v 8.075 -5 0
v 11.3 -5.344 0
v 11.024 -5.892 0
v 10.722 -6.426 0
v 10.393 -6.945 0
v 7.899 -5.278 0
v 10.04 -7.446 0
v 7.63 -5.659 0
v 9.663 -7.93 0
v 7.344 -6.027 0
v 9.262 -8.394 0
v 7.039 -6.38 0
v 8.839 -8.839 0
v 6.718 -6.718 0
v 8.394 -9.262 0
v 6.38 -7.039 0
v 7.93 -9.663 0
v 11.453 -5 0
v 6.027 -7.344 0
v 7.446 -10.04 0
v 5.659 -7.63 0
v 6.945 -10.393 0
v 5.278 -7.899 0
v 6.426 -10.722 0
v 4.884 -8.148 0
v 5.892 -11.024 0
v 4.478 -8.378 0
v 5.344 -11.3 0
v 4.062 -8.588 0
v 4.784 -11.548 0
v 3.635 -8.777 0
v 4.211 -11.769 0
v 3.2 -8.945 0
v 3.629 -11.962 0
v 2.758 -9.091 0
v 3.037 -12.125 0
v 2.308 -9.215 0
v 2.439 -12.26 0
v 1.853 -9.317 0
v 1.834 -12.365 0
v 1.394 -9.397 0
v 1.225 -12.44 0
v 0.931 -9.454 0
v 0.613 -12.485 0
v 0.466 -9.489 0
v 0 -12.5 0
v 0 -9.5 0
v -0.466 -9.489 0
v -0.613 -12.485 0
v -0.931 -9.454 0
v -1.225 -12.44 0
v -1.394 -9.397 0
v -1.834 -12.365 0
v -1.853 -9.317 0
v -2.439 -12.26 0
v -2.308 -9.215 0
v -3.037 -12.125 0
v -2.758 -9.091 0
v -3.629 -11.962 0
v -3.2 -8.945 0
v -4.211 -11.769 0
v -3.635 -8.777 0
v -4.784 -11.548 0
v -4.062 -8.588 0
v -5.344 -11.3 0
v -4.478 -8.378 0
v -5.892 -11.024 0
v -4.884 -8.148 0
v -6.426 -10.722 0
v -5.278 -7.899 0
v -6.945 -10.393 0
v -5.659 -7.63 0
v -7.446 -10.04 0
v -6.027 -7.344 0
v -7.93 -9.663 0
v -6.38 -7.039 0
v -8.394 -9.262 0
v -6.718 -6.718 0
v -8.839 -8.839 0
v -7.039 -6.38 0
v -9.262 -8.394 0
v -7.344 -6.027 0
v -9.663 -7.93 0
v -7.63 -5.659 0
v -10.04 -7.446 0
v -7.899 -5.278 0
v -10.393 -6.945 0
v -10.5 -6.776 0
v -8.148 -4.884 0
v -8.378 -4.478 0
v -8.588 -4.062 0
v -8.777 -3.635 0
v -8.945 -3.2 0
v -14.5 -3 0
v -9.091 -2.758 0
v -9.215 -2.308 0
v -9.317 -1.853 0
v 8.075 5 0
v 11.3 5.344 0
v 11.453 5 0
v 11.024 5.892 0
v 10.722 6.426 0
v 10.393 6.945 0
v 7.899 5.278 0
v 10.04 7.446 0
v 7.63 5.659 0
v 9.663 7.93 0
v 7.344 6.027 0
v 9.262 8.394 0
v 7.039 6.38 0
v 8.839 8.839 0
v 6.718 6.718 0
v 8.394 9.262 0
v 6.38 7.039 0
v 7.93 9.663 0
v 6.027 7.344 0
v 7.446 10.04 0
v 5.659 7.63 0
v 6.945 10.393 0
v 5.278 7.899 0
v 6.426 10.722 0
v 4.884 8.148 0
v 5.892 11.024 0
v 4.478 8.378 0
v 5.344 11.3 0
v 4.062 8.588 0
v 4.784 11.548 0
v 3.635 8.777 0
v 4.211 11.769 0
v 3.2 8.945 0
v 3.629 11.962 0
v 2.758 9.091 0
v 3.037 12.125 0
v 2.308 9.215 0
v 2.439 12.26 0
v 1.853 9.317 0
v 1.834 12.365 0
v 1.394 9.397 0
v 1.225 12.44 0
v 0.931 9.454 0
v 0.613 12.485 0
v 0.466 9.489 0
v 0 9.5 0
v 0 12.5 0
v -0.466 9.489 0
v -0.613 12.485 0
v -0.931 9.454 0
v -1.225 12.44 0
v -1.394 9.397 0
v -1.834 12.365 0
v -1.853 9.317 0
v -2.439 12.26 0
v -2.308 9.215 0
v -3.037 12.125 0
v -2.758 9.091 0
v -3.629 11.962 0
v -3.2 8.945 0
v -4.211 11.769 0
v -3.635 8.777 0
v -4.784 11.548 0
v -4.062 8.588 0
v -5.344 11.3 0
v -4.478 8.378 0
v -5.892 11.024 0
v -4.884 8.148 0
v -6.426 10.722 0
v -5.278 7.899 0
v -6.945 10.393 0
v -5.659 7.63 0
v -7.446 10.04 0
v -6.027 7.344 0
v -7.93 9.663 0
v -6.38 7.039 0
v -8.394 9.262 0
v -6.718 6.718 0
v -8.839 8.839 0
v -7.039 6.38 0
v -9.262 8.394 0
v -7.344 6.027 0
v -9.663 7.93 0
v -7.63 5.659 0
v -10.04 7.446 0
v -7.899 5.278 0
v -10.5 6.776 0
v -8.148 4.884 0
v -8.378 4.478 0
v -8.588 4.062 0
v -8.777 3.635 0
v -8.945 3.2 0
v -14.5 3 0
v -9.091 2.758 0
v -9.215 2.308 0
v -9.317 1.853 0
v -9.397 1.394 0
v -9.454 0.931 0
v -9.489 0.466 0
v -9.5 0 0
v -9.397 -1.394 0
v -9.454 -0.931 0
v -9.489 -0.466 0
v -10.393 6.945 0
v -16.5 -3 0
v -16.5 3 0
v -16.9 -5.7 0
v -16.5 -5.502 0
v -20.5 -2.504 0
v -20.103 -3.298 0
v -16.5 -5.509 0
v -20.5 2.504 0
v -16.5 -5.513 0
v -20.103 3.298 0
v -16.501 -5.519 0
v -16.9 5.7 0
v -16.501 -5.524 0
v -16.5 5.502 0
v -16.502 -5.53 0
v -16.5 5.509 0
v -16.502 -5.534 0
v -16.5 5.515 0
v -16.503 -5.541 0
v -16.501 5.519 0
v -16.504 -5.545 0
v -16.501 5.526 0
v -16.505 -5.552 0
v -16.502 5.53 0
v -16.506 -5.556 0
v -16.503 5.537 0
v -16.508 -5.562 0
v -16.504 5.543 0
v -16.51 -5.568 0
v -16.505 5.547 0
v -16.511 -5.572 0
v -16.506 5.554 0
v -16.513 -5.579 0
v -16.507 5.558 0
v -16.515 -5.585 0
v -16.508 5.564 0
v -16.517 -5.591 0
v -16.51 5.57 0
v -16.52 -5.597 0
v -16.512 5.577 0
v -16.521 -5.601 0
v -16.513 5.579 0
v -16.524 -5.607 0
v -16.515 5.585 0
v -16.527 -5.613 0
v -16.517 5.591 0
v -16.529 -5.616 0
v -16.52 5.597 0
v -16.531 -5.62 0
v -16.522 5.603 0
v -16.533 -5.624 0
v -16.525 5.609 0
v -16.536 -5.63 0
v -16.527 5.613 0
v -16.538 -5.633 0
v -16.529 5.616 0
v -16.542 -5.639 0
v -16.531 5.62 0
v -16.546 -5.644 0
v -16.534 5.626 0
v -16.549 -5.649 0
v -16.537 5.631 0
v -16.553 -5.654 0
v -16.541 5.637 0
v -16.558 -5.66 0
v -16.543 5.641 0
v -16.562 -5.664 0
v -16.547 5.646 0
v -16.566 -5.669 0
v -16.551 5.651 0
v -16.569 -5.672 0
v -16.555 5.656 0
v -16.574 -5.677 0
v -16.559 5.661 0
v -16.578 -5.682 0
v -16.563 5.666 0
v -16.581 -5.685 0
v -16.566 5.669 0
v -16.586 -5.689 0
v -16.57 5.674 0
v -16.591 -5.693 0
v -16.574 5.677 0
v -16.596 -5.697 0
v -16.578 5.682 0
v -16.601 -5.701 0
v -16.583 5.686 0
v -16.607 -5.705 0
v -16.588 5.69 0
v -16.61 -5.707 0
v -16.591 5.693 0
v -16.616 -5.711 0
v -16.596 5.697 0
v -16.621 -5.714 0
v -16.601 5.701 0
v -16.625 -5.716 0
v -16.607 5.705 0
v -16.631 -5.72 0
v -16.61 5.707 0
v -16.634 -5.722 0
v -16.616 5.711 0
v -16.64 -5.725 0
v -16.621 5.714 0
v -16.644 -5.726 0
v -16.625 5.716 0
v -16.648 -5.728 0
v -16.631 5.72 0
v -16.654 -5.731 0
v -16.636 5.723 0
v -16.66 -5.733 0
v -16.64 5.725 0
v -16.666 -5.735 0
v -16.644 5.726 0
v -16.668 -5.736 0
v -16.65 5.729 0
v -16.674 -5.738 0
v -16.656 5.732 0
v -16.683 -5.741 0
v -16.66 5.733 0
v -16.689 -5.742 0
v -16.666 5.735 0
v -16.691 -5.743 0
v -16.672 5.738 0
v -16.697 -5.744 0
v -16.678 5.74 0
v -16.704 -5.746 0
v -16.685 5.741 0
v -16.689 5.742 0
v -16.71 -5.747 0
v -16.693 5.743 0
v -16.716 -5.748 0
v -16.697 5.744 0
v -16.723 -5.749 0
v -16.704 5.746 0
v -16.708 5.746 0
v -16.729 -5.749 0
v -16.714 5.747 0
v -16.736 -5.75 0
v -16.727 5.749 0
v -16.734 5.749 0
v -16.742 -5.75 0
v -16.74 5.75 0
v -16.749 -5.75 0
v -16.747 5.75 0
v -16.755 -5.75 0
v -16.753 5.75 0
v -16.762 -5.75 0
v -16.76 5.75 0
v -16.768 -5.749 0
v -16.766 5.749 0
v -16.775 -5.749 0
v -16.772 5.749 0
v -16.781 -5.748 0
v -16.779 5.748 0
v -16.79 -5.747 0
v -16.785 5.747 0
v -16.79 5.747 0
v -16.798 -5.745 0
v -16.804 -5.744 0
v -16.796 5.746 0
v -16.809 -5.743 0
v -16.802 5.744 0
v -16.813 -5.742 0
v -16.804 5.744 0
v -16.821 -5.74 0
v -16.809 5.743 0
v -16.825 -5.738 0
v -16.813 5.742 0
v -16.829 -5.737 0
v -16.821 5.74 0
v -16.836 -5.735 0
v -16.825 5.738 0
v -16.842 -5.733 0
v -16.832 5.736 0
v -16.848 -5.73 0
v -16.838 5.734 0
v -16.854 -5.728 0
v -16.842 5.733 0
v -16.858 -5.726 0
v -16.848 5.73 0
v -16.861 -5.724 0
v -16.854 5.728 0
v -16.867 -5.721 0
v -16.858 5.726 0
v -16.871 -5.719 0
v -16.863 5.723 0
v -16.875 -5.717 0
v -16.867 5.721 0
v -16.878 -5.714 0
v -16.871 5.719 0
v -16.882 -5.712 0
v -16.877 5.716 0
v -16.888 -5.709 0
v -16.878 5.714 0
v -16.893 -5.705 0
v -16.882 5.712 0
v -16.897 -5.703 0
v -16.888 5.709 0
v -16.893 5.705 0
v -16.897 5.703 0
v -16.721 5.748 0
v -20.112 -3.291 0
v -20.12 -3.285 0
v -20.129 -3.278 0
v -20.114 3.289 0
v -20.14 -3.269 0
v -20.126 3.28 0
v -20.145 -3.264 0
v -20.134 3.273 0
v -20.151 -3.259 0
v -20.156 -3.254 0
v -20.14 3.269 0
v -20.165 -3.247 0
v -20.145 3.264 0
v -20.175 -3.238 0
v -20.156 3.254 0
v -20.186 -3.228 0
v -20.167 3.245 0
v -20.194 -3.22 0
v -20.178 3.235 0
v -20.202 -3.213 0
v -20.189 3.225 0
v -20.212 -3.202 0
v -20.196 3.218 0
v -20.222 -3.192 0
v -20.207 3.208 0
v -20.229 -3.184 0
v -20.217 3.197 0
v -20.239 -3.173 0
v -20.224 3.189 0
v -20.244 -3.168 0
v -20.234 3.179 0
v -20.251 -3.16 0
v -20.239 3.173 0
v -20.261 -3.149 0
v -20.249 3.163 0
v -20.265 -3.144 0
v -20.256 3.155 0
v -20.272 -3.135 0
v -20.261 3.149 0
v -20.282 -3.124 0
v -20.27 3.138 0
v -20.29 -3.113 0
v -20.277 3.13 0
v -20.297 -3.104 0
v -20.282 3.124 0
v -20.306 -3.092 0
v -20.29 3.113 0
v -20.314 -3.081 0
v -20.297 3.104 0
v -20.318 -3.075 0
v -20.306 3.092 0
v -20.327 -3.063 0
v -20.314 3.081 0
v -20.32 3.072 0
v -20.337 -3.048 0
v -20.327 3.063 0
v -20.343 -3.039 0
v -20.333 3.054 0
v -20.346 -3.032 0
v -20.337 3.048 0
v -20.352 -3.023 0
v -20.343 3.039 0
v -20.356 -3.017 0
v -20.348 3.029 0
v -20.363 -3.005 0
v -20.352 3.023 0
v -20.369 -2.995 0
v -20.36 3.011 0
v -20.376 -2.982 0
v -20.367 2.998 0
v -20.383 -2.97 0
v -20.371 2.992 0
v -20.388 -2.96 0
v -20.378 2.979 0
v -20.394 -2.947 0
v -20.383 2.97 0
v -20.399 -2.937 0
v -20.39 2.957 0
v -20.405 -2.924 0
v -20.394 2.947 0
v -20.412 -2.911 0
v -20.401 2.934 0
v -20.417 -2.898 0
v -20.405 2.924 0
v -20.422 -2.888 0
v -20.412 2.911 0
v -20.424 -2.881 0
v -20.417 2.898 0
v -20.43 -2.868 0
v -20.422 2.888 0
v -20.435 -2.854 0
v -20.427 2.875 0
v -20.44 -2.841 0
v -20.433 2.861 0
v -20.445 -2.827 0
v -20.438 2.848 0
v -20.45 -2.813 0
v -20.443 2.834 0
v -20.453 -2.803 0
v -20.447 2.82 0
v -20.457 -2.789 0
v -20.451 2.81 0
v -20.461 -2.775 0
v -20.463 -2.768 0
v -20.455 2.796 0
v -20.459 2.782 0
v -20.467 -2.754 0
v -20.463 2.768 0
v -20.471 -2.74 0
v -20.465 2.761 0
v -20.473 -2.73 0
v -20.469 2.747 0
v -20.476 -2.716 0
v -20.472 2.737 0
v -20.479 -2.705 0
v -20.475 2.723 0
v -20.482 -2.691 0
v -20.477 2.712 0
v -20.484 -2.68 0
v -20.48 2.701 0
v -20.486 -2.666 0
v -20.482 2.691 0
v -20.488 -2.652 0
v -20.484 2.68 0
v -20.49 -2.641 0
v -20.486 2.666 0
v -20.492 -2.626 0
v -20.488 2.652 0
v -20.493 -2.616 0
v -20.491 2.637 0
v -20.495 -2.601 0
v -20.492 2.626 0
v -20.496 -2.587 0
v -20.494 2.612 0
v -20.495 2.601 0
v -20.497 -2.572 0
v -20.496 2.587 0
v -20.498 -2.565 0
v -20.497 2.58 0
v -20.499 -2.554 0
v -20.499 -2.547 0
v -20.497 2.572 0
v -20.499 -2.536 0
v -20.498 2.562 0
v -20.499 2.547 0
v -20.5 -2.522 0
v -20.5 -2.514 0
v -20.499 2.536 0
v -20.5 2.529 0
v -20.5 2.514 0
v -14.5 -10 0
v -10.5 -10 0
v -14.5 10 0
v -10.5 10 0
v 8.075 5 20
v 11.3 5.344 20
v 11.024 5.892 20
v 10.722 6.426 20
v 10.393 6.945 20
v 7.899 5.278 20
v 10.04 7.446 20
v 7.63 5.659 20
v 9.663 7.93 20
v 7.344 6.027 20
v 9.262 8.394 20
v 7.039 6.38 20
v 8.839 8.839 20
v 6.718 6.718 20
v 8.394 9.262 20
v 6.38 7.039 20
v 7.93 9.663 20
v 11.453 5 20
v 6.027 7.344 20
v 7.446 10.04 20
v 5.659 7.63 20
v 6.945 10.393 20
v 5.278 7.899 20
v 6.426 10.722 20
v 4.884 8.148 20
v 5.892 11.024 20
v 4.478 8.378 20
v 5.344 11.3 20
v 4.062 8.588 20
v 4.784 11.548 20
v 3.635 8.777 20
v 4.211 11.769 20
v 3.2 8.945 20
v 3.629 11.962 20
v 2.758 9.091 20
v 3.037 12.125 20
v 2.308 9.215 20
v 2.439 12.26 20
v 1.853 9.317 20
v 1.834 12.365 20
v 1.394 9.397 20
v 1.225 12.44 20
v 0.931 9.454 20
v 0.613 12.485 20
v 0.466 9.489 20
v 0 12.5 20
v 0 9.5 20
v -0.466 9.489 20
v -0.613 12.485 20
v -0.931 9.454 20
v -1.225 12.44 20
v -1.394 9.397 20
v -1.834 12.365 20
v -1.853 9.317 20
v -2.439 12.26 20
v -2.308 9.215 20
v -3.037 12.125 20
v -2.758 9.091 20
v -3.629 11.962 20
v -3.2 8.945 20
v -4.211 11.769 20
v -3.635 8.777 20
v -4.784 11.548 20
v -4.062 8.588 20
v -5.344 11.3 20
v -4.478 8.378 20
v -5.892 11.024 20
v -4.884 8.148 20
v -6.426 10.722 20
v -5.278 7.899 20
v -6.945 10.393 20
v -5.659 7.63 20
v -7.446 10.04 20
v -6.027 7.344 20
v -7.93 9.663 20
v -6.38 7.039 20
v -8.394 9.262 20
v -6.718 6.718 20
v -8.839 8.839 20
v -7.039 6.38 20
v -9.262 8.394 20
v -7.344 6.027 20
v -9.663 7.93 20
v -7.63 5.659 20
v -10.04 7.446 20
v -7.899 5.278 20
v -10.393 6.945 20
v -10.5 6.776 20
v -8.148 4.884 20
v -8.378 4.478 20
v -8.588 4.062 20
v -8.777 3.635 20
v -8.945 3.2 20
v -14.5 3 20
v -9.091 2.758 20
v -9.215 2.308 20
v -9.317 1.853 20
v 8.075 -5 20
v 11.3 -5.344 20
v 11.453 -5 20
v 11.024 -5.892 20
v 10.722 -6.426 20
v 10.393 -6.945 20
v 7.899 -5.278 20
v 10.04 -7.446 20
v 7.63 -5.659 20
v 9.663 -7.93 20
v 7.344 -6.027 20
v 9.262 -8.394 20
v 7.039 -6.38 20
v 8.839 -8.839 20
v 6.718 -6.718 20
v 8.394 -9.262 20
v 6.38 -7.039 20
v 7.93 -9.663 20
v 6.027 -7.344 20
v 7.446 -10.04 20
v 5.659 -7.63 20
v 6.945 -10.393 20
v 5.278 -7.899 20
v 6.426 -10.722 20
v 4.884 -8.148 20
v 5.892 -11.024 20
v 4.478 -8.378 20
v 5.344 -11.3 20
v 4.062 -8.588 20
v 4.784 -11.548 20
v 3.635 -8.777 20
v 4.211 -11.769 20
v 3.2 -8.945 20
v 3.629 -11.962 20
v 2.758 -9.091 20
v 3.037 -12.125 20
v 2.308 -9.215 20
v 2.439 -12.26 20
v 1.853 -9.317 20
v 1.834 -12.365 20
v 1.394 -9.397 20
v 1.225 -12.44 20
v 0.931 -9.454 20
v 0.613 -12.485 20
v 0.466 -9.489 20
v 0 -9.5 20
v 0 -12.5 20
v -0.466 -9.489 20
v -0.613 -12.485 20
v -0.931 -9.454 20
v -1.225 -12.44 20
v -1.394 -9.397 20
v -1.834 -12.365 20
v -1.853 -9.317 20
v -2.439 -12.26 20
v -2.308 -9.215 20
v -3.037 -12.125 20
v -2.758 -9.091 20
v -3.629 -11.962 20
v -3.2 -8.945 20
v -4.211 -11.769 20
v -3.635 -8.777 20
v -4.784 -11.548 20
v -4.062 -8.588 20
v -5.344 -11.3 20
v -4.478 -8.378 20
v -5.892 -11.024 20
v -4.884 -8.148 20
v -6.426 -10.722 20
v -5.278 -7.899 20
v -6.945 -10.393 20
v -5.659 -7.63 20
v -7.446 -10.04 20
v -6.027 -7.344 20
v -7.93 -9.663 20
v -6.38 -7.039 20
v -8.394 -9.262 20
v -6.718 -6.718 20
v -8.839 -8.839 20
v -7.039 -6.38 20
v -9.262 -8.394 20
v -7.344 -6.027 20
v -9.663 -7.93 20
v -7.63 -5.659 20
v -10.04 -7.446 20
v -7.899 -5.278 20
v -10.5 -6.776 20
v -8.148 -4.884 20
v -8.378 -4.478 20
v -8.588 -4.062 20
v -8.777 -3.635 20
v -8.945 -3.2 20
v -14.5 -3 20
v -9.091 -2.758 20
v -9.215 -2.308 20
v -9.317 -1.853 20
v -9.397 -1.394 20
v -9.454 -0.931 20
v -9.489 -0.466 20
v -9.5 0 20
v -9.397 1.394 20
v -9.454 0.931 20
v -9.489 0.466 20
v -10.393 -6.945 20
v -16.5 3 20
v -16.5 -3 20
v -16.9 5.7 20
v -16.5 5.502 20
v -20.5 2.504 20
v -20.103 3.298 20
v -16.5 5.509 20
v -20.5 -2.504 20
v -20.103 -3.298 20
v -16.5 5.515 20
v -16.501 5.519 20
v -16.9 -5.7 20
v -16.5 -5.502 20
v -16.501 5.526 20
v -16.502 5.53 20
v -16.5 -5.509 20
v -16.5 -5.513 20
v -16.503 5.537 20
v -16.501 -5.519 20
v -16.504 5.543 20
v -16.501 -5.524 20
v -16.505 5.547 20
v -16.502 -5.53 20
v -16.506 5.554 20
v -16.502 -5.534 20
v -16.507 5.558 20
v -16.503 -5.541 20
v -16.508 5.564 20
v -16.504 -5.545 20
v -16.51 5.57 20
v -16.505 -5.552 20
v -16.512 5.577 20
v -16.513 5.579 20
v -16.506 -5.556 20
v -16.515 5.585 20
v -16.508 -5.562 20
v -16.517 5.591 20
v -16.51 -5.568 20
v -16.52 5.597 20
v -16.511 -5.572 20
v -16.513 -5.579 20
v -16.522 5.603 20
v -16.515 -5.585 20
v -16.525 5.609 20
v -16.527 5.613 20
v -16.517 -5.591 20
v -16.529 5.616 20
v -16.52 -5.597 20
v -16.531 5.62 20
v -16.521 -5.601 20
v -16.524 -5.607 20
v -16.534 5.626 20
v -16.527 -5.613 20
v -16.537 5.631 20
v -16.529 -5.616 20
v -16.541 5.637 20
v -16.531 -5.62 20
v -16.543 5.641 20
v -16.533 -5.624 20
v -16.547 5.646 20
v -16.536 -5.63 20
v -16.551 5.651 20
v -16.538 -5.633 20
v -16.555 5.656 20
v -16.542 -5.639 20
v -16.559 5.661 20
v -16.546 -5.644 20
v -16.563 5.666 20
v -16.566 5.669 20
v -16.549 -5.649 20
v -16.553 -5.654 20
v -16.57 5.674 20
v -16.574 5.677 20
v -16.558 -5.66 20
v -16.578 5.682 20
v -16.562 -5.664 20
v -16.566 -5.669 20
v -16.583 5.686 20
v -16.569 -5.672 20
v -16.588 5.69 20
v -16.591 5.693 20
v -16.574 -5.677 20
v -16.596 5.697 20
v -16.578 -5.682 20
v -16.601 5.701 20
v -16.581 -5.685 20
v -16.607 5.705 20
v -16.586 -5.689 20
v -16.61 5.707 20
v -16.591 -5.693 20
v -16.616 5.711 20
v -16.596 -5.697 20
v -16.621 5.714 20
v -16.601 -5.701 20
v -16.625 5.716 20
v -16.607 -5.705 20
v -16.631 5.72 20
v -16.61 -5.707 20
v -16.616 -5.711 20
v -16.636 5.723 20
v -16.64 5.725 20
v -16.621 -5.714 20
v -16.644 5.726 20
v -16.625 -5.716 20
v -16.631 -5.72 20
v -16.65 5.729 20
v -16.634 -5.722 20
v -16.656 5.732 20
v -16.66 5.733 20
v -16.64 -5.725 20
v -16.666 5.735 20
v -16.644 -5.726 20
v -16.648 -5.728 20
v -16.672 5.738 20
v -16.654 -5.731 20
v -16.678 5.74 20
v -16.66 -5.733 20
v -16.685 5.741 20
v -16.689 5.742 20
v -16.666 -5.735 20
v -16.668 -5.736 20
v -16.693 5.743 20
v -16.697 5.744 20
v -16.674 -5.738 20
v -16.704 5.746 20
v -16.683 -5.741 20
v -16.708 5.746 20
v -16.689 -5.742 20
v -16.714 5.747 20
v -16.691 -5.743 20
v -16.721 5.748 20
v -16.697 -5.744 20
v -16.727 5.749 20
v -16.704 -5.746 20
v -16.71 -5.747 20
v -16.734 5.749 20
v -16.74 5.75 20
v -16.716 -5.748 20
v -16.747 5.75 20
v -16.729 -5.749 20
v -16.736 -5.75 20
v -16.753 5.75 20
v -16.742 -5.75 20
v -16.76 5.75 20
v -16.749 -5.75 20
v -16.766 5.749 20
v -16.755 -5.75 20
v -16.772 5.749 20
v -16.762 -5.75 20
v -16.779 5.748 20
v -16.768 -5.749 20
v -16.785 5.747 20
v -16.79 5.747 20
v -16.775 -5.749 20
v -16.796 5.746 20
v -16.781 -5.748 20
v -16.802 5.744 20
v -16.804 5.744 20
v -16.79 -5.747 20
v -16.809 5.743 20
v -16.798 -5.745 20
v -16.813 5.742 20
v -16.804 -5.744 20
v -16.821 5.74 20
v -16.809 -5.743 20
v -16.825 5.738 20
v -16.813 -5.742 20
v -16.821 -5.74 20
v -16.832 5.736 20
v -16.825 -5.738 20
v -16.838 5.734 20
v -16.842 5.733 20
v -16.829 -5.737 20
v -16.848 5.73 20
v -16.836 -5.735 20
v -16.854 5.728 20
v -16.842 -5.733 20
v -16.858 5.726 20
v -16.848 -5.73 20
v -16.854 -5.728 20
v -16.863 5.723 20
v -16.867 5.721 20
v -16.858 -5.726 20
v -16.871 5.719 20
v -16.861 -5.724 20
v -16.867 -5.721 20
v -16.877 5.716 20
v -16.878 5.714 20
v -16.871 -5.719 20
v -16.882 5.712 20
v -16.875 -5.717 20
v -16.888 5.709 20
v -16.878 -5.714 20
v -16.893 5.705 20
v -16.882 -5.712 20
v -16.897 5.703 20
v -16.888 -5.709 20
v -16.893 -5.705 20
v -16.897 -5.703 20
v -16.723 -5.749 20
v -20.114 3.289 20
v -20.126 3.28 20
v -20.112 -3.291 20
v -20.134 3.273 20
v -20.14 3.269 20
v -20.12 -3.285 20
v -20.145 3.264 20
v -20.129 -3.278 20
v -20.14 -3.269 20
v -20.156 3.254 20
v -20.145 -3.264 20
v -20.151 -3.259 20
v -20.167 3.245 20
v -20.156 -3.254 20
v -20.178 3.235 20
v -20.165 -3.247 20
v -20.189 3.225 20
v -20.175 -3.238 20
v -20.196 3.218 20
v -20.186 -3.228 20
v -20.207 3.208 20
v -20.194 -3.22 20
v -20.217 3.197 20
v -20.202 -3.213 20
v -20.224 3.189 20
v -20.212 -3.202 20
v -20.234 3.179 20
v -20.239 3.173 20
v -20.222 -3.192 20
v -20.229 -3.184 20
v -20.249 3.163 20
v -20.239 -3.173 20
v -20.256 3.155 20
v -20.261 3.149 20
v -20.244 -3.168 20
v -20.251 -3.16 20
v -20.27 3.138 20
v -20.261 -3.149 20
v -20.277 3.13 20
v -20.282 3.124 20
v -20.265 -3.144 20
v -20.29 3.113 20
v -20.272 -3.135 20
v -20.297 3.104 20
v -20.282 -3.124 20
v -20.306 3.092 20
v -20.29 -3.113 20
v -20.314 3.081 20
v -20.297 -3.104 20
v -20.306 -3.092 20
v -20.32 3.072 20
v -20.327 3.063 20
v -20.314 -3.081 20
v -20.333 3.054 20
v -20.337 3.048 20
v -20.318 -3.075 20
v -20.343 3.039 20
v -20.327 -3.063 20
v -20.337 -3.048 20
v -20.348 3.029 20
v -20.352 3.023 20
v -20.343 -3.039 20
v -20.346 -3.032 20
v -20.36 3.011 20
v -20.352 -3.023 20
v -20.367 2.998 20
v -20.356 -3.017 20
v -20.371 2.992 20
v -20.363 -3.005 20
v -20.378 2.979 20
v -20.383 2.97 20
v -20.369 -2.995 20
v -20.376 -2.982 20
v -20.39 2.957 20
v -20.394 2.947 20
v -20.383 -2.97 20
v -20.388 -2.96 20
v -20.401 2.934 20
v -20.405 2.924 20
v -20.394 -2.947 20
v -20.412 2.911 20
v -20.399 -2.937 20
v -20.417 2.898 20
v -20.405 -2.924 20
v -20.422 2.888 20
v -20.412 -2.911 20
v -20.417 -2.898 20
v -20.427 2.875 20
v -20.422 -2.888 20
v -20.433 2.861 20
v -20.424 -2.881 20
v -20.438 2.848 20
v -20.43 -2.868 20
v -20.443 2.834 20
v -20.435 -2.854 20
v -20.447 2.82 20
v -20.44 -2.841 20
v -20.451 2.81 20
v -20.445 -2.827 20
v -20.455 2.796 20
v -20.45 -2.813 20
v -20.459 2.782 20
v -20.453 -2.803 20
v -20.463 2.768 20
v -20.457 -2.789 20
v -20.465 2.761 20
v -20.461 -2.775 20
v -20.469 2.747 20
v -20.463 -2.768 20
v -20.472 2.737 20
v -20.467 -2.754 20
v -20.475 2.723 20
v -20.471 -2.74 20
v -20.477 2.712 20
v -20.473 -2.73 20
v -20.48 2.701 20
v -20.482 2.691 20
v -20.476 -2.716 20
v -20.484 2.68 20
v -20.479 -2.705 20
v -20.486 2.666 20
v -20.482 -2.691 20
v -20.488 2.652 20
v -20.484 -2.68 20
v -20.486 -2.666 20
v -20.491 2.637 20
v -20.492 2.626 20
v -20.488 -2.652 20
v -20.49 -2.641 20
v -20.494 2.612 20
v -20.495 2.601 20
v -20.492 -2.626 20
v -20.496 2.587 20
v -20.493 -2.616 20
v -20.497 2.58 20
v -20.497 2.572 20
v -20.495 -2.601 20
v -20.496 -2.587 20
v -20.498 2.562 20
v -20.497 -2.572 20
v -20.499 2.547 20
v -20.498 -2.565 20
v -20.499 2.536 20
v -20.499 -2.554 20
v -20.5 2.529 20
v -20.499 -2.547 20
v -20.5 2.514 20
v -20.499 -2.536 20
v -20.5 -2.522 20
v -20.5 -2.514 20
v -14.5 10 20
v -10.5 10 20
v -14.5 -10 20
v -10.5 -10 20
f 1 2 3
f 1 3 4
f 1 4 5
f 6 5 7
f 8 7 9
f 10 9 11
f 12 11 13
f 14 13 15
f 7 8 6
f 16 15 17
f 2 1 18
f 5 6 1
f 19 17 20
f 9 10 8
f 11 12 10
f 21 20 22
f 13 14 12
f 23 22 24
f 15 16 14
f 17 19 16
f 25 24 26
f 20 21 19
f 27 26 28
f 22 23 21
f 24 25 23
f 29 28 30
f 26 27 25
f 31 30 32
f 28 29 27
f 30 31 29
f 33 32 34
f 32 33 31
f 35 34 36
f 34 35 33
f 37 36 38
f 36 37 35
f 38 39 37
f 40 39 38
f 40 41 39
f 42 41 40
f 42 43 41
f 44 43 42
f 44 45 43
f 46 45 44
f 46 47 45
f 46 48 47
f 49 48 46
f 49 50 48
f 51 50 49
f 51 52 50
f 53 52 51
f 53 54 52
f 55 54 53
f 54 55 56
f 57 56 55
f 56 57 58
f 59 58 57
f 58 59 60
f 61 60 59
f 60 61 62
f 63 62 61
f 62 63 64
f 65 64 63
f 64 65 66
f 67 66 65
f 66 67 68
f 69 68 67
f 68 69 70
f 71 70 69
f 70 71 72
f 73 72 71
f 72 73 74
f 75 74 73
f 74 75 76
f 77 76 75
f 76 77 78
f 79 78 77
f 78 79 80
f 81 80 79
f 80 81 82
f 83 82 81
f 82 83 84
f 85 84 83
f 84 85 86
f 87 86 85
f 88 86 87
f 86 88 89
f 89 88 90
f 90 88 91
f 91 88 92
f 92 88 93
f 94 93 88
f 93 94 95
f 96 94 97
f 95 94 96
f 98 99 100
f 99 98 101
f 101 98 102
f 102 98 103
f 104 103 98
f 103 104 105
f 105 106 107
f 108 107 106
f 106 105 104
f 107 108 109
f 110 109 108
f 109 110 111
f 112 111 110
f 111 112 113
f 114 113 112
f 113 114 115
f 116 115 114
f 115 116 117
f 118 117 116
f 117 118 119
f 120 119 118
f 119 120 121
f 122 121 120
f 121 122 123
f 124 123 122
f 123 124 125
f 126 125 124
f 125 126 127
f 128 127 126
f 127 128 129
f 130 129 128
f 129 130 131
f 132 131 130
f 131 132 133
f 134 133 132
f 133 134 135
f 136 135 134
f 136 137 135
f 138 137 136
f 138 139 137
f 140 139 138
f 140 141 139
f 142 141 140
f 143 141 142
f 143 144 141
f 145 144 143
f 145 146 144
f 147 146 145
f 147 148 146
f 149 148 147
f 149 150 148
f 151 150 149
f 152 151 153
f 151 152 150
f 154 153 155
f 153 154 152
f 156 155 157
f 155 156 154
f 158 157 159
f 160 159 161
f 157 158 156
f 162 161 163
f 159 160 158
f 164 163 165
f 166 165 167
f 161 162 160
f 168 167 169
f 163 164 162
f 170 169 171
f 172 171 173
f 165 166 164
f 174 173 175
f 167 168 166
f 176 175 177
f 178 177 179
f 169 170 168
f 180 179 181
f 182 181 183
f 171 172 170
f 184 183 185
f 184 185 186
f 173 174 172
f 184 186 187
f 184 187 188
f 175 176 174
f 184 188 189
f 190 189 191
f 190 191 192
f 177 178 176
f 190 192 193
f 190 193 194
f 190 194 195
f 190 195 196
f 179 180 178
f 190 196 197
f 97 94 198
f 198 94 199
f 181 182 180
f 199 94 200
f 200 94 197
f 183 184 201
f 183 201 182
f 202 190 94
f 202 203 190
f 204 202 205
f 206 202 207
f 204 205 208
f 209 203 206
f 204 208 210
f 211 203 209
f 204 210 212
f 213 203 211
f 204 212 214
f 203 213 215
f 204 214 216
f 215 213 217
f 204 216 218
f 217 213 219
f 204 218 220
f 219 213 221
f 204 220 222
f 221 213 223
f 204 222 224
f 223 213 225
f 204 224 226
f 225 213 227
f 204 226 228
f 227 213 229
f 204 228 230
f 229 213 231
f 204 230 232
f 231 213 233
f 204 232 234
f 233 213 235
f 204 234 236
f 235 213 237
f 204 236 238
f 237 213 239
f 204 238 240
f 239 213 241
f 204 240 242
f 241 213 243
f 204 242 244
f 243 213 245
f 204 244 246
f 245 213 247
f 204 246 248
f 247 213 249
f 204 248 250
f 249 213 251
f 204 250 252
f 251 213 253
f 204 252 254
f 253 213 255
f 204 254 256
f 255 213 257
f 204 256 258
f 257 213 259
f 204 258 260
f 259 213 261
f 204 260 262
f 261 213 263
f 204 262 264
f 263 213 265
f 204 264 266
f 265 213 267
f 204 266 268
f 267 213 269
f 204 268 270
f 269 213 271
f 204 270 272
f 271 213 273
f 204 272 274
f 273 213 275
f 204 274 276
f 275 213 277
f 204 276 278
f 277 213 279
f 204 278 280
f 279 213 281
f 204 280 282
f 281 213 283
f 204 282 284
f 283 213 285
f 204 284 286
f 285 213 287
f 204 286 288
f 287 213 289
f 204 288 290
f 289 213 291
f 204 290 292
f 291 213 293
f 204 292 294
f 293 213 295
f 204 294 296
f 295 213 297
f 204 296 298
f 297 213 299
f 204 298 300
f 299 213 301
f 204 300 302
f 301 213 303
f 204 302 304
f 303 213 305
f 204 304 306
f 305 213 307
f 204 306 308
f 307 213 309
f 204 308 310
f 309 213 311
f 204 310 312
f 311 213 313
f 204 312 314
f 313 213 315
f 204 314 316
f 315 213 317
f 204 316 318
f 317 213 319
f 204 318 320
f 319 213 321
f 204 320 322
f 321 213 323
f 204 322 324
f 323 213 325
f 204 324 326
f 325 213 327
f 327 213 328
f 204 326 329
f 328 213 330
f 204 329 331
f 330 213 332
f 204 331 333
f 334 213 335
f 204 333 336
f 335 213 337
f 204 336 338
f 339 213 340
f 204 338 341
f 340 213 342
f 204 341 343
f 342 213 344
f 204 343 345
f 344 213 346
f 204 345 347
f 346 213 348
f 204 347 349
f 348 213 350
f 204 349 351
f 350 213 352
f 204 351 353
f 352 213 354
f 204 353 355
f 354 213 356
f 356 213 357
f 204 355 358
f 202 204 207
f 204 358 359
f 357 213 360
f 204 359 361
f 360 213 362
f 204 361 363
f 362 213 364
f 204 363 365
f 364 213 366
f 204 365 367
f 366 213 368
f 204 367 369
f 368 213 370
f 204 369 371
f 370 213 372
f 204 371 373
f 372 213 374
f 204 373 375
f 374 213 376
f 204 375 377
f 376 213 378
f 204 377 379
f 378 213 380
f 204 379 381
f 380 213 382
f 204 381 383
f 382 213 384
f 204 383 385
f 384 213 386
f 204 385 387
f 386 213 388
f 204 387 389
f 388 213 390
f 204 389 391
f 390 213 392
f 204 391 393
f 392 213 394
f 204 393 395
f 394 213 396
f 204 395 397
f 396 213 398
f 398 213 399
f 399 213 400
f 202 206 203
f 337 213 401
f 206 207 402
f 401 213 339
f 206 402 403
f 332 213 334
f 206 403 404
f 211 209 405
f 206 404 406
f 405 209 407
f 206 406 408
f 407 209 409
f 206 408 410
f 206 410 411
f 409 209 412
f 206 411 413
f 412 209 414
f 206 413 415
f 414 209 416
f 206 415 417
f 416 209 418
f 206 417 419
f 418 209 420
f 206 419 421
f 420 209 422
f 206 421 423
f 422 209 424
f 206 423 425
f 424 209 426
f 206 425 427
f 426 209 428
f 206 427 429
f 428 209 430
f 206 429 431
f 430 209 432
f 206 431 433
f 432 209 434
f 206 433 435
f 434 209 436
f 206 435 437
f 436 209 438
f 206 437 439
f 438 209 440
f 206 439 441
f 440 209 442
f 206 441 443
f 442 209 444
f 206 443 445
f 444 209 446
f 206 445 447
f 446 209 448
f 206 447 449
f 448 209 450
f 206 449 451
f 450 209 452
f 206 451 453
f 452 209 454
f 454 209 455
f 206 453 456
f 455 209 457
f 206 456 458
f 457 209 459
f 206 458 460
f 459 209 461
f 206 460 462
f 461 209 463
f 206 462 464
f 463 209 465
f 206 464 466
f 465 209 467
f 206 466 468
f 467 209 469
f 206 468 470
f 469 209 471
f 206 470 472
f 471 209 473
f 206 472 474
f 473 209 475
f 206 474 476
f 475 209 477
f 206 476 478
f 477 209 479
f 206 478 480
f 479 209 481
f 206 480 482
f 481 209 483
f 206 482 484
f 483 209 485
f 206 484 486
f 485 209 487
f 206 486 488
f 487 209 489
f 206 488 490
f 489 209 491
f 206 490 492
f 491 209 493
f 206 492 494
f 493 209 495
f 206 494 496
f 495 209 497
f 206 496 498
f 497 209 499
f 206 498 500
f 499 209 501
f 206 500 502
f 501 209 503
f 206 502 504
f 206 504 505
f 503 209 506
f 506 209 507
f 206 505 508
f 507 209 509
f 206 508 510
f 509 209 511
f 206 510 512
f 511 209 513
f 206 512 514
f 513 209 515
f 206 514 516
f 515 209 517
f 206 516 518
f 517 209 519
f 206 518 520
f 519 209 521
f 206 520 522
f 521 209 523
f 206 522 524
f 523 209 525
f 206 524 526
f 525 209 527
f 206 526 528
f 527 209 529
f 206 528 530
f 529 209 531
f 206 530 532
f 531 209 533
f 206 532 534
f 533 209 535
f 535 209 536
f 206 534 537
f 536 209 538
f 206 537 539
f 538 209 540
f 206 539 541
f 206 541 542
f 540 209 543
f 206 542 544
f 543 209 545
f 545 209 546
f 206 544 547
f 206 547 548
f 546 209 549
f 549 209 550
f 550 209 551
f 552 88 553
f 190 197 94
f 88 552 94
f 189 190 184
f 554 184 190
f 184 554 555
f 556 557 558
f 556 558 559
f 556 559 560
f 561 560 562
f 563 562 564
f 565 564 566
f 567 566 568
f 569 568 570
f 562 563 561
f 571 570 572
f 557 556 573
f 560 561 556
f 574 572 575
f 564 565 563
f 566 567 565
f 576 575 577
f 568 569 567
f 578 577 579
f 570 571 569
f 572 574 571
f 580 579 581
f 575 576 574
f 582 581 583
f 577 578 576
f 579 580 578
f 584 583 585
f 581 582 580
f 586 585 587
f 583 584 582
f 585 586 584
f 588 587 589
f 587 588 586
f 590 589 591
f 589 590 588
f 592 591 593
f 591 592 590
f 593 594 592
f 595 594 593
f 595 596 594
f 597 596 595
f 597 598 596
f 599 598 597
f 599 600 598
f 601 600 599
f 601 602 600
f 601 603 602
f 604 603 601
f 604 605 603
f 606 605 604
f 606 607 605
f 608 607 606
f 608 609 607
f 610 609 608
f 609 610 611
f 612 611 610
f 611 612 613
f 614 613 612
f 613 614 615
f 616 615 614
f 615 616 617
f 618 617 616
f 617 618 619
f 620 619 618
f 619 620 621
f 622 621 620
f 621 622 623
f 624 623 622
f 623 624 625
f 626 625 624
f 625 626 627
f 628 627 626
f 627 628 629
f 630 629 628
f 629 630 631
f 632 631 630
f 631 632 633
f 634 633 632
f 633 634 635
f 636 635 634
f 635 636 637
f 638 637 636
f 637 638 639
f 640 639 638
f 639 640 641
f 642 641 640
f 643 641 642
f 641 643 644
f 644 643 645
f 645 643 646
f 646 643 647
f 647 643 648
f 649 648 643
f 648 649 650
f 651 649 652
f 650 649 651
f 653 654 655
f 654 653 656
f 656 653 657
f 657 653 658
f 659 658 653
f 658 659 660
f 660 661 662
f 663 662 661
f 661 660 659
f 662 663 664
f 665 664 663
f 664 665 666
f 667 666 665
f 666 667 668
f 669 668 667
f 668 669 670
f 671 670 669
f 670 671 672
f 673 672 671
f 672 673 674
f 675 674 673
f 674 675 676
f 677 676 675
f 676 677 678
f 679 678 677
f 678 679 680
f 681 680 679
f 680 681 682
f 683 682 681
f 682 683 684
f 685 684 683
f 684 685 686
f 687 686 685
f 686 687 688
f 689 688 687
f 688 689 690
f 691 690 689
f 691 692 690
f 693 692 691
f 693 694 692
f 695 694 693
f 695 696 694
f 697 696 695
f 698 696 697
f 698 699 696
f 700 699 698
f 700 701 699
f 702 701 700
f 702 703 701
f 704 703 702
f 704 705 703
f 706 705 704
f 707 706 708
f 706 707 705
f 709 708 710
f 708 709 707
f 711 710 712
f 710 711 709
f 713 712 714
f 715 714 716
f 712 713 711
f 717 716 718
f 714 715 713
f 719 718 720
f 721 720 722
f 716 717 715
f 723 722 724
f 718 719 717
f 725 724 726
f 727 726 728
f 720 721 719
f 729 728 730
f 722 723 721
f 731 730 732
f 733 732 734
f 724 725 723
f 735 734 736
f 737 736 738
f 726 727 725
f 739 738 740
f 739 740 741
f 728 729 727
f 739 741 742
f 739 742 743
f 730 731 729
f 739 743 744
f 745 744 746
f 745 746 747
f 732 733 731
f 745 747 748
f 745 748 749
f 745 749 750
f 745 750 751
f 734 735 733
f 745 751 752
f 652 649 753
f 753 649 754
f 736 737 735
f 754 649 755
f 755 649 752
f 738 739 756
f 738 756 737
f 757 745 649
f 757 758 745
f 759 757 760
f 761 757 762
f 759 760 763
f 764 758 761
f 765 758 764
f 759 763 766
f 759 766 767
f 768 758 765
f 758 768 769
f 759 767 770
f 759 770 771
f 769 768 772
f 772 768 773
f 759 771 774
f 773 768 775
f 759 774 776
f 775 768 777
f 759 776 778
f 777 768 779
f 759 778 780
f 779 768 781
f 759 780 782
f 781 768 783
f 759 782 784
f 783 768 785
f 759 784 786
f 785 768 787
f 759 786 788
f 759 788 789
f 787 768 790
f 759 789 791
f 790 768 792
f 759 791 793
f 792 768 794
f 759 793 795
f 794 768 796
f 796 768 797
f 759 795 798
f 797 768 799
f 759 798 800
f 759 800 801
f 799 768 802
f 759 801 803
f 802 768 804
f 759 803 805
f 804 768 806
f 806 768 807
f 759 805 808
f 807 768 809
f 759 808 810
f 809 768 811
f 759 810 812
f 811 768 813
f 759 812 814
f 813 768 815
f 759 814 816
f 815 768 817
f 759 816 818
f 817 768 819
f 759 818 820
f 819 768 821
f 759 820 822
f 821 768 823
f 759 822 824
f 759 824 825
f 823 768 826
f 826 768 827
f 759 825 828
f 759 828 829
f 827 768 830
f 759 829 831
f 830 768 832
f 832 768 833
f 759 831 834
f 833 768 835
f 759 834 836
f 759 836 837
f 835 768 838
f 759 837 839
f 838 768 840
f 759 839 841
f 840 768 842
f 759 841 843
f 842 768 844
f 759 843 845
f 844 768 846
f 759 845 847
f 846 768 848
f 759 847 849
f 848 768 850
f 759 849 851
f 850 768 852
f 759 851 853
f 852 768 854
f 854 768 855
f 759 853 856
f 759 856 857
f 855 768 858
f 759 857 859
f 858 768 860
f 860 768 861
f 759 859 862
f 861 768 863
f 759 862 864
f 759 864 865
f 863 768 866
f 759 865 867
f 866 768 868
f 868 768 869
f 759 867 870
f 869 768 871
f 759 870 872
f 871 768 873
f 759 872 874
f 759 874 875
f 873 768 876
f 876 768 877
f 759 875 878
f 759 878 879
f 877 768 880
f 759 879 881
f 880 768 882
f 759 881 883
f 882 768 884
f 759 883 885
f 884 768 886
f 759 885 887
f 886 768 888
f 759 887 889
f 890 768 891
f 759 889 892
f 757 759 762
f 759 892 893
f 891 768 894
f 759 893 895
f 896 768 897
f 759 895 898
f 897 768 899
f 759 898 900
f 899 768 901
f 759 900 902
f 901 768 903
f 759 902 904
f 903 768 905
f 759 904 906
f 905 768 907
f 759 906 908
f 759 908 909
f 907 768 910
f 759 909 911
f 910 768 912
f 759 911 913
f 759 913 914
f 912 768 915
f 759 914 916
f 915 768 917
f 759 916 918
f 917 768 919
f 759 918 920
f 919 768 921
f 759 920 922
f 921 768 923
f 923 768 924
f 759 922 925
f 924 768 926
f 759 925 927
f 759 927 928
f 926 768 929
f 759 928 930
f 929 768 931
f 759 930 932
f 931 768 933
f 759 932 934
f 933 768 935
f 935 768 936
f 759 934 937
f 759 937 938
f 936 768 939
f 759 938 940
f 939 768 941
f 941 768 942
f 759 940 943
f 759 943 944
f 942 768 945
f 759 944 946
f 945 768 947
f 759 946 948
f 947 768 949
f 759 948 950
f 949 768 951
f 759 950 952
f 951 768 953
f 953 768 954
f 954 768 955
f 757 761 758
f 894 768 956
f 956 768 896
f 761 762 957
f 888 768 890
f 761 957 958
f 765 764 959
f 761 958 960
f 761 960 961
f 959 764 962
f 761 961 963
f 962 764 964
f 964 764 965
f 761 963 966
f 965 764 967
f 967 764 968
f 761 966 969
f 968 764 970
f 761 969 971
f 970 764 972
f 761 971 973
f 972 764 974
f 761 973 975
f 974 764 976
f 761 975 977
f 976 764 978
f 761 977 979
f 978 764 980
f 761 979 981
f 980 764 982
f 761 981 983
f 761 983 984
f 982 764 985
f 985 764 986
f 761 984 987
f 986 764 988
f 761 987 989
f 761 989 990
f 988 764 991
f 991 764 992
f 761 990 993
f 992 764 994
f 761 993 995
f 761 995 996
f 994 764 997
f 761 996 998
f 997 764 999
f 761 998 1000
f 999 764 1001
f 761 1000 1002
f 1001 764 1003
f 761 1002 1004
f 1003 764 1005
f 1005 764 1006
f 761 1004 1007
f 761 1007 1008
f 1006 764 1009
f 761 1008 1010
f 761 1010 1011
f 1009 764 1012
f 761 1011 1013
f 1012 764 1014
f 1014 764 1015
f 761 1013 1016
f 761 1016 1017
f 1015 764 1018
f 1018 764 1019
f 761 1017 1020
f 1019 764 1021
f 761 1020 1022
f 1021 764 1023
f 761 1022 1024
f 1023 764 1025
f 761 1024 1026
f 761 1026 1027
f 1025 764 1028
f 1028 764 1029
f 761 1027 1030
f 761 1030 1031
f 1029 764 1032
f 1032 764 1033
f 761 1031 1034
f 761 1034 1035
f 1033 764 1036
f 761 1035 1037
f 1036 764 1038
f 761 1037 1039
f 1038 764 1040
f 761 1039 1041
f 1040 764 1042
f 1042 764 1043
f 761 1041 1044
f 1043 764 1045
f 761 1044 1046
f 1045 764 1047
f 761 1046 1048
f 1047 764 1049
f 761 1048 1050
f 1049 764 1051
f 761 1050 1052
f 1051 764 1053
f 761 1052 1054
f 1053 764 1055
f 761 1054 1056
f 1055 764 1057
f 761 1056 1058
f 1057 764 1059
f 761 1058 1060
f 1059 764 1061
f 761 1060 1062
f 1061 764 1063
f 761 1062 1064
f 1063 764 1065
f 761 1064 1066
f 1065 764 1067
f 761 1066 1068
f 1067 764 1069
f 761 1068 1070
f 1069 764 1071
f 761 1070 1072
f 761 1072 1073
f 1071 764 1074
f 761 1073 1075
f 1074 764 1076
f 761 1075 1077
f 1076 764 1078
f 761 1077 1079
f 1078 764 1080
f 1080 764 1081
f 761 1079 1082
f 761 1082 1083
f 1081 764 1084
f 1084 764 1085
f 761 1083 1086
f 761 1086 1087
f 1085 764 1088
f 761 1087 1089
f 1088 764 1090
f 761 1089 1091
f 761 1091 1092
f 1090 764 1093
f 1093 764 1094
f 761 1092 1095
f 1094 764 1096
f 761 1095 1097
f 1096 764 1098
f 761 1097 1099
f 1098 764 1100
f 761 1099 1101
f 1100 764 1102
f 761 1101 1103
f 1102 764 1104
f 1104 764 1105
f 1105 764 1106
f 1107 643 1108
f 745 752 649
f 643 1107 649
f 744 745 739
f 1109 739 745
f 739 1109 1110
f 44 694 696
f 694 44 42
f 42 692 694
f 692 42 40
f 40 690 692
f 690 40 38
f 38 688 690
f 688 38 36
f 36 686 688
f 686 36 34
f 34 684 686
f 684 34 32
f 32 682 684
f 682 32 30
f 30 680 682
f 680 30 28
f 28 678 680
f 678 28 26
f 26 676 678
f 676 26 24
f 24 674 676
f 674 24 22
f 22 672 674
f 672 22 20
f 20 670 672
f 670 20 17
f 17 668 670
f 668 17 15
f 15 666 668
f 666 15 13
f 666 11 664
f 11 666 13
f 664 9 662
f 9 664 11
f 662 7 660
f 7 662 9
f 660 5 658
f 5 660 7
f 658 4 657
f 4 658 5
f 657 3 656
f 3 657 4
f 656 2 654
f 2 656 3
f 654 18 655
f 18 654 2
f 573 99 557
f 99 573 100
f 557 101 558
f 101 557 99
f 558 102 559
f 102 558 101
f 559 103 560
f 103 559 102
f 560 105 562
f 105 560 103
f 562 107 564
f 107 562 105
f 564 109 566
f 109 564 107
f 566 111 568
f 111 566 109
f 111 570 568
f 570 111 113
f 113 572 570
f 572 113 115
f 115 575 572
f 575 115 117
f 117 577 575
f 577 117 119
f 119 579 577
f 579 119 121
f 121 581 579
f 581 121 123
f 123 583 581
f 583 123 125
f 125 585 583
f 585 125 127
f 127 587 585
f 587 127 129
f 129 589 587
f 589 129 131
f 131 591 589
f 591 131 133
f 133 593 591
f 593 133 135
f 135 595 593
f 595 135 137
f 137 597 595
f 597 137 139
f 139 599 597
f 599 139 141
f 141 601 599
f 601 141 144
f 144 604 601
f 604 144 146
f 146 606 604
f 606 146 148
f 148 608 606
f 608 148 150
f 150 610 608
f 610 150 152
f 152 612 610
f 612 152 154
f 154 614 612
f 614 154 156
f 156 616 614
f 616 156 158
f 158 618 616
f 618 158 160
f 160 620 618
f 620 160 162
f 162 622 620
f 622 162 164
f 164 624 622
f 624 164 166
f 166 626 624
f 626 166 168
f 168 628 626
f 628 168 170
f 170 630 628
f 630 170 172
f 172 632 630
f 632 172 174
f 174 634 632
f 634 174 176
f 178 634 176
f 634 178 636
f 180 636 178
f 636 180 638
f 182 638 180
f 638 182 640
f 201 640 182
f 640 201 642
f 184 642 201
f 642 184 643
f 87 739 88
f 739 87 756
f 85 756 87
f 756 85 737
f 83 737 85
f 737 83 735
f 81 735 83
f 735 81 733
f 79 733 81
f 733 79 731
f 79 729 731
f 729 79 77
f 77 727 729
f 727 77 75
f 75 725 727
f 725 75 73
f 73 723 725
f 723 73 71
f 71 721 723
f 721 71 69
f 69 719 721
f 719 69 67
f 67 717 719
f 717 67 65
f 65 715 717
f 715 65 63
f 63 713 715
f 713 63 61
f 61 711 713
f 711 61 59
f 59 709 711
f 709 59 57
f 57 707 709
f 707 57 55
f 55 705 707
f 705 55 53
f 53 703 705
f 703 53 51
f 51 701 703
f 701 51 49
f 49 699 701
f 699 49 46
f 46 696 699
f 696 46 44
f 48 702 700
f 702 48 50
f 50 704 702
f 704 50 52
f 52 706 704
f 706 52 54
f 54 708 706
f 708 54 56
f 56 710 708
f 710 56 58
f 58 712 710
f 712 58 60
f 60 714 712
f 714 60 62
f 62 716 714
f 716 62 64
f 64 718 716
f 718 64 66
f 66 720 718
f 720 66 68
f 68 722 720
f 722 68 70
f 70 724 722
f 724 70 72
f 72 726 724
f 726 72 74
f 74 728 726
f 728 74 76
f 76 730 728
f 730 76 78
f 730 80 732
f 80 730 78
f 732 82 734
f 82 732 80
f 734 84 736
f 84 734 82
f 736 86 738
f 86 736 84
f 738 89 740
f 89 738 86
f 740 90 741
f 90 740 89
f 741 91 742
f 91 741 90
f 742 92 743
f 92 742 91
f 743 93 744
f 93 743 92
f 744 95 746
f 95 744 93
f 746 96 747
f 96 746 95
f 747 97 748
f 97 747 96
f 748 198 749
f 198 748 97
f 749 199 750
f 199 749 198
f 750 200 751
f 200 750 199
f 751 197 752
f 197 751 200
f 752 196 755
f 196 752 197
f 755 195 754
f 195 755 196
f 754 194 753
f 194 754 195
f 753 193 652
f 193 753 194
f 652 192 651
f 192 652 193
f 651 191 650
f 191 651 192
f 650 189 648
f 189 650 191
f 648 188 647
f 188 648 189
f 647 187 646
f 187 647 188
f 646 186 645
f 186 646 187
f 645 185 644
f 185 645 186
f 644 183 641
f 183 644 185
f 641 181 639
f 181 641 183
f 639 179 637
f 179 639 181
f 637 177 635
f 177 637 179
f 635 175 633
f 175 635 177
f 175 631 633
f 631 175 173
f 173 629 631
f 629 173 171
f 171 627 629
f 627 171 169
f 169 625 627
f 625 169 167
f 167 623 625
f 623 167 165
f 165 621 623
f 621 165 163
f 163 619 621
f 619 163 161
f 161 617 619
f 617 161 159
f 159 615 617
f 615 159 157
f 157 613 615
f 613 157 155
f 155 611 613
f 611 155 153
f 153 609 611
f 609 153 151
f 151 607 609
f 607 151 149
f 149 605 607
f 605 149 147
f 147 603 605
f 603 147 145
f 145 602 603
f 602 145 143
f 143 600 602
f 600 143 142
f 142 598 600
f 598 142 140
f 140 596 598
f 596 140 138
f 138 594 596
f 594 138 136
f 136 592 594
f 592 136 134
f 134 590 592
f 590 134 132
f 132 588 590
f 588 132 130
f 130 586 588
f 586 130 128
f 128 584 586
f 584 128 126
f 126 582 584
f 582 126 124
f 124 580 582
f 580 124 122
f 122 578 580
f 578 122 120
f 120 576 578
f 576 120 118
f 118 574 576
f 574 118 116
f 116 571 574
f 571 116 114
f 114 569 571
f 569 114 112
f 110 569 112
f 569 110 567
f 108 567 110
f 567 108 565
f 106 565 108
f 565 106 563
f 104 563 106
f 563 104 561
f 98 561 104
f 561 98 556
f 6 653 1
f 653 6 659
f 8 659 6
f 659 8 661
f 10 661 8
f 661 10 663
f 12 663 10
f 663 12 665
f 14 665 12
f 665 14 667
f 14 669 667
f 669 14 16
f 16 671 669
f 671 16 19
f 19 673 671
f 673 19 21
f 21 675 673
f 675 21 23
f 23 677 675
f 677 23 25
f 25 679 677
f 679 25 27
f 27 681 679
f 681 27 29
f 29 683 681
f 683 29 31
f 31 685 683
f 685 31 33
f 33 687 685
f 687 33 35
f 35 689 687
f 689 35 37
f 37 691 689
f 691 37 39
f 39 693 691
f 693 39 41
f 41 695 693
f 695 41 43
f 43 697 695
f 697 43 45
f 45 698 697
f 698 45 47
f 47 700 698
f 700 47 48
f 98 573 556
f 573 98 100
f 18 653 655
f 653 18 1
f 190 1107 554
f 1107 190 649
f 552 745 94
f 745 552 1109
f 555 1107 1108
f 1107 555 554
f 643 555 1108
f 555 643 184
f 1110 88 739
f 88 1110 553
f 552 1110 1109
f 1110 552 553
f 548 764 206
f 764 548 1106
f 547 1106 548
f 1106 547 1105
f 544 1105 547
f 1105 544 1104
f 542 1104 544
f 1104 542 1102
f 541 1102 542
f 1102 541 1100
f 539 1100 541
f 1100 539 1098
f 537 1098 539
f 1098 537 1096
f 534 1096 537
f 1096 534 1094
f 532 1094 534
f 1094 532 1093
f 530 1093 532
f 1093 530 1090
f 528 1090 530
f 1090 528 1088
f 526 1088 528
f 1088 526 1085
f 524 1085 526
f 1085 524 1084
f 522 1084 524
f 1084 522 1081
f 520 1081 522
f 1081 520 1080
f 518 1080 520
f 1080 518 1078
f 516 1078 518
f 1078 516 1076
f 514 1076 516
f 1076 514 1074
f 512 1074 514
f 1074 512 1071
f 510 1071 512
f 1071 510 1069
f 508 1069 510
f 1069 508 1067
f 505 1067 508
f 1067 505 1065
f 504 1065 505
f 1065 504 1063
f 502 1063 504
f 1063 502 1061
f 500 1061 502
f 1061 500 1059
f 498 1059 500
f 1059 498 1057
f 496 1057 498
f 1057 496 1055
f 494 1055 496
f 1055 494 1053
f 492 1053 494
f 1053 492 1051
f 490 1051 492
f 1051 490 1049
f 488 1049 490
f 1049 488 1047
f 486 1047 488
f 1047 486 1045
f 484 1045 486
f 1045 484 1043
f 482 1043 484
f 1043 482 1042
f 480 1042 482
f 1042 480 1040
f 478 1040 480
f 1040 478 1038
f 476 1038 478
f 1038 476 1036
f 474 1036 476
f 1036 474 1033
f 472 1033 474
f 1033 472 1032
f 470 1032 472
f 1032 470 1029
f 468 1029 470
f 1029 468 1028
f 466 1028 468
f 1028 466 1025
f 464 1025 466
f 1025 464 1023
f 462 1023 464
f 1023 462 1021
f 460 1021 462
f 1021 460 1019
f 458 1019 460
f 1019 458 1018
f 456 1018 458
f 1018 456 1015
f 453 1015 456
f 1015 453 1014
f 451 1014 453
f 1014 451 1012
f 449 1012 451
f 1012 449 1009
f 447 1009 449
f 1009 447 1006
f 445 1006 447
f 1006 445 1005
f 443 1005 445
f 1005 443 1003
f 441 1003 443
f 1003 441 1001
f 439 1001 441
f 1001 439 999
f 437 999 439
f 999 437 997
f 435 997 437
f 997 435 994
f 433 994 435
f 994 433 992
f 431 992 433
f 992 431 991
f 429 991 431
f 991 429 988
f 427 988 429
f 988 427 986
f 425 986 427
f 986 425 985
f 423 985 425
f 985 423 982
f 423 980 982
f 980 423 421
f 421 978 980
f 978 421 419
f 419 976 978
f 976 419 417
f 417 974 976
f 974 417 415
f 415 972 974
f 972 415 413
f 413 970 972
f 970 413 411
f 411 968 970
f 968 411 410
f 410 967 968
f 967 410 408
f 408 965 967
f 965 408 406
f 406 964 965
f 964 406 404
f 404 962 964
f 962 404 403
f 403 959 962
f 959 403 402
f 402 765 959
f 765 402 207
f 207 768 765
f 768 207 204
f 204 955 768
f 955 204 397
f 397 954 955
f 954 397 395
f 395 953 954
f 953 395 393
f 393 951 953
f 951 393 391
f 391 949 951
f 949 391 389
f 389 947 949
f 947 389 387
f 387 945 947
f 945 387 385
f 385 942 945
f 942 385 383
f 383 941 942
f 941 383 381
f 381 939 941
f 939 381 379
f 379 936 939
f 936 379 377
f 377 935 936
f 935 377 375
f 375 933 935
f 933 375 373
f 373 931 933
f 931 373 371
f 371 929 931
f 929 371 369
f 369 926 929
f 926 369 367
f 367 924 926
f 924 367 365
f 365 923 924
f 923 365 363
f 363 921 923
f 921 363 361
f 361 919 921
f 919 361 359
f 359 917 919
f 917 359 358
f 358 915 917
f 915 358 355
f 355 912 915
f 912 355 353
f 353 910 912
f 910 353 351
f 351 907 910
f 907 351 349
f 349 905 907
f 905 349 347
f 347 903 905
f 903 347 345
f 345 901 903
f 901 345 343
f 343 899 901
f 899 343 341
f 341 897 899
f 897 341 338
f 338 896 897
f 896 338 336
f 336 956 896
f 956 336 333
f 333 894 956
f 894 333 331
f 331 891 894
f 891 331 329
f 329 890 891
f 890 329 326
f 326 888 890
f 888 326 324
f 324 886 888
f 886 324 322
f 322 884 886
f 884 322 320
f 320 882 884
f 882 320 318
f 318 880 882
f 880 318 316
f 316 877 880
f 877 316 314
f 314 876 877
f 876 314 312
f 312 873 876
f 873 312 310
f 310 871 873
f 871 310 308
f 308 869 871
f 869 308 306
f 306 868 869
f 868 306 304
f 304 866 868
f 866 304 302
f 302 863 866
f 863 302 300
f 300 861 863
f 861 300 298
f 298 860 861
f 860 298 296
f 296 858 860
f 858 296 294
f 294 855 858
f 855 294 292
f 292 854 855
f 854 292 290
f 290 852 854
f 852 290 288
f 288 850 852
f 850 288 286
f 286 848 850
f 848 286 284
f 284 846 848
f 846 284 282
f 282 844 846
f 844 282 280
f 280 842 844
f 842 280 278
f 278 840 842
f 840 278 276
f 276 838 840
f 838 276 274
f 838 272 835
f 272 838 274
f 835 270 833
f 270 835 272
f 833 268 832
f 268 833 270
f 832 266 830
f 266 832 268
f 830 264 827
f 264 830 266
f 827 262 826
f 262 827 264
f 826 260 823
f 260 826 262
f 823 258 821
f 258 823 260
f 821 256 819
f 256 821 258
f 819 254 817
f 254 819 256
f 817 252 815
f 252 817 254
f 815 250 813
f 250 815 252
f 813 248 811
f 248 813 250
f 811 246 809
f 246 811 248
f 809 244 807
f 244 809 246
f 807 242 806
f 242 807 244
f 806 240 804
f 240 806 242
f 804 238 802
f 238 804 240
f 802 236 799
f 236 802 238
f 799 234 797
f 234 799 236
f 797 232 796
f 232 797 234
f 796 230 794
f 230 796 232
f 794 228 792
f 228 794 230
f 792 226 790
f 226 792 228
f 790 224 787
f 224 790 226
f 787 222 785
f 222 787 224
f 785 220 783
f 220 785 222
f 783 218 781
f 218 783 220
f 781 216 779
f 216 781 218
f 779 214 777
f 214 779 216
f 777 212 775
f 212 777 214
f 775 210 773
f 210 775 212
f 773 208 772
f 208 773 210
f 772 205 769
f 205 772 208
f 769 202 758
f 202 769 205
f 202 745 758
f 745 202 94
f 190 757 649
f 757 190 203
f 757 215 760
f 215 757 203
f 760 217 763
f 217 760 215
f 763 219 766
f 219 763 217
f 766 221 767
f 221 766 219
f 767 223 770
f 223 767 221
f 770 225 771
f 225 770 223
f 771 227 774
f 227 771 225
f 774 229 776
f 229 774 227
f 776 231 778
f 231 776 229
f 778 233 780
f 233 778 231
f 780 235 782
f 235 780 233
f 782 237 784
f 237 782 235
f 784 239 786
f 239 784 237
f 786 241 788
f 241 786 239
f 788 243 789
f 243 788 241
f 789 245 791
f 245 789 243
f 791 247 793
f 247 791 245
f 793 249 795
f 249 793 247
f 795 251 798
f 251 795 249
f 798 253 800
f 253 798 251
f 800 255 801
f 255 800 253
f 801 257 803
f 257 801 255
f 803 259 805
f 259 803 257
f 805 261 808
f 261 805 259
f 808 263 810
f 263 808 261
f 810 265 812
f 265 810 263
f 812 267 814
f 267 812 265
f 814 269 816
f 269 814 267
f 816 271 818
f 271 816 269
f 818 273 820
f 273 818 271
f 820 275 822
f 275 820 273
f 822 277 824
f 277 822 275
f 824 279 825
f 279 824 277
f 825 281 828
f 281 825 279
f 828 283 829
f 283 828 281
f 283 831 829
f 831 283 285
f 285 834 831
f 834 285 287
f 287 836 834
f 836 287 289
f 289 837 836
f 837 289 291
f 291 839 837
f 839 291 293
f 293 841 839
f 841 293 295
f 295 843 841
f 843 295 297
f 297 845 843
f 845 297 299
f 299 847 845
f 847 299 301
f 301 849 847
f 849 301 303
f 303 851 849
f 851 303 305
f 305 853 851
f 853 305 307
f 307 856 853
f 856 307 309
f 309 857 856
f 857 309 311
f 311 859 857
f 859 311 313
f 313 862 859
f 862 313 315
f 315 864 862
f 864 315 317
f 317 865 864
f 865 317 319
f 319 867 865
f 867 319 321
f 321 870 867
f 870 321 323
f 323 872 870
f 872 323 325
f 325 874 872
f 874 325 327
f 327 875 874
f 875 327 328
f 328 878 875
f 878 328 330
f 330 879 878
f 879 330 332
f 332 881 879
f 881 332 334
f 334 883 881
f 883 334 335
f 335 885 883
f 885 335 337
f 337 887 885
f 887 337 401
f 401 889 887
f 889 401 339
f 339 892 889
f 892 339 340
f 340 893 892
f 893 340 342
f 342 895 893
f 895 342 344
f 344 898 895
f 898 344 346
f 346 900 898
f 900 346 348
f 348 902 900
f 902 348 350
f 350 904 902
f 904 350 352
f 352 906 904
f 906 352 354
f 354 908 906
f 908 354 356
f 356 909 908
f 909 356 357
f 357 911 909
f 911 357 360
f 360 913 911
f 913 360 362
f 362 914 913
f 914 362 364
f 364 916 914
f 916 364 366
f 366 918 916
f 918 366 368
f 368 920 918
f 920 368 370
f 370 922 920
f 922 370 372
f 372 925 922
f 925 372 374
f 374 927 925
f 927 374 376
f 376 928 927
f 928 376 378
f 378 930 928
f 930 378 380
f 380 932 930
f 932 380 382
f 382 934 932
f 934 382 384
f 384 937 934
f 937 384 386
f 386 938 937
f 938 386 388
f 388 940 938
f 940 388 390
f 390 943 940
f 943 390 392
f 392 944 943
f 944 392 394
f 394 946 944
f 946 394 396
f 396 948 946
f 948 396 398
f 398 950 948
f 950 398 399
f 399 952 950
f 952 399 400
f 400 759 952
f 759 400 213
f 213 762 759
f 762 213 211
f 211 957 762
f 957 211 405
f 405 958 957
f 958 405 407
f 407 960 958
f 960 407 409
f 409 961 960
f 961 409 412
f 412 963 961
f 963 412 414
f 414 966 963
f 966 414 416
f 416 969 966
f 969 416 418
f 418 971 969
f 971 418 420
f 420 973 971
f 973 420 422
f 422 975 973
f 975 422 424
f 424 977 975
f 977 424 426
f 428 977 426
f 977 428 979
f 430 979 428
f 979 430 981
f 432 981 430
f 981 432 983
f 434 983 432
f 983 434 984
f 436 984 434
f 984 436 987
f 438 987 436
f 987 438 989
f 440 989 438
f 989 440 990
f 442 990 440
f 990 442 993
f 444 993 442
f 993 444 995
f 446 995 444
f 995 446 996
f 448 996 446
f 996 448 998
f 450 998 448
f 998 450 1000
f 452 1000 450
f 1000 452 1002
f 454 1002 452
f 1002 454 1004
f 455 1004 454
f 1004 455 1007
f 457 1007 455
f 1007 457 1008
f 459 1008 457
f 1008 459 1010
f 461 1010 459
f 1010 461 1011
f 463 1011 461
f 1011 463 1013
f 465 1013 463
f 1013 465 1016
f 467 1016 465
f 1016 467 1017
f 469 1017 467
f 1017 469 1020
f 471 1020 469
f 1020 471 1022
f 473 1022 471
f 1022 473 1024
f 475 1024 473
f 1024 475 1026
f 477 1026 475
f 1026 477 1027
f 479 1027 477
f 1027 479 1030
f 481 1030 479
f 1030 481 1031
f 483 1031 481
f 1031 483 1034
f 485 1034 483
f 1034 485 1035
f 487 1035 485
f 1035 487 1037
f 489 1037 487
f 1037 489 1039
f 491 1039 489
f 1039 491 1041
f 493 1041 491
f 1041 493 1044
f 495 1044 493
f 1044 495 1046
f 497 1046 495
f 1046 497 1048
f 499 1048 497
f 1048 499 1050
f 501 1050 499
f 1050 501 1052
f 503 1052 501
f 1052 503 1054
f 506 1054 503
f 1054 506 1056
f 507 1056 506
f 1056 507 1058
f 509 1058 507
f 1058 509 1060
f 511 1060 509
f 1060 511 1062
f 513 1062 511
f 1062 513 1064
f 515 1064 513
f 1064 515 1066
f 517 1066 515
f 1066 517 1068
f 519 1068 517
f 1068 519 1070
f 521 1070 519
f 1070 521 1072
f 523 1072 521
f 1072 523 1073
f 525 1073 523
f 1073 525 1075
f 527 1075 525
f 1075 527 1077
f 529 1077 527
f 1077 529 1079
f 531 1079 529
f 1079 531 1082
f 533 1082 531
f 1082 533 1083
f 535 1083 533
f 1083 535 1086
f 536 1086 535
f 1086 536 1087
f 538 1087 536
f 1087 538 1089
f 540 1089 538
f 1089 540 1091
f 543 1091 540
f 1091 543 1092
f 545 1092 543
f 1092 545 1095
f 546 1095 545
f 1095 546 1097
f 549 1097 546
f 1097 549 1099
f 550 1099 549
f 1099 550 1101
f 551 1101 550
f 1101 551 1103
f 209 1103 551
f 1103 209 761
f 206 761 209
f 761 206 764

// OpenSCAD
// file: extrusion-mount.scad
include <Round-Anything/polyround.scad>

mount_polygon = [
    [-3,0,1],
    [-6,4,0.25],
    [-3,4,0],
    [-3,6,0],
    [3,6,0],
    [3,4,0],
    [6,4,0.25],
    [3,0,1]
];

 module extrusion_mount(length) {
    translate([6,length/2,0]) {
        rotate([90,270,0]) {
            linear_extrude(length)
                polygon(polyRound(mount_polygon, 256));
        }
    }
  }
// main file
include <extrusion-mount.scad>


pipe_dia = 19;
mount_thickness = 3;
mount_length = 20;
mount_width = 20;
gap = 10;
base_thickness = 4;


union() {
    difference() {
        linear_extrude(mount_length) {
            difference() {
                circle(d = pipe_dia + 2*mount_thickness, $fn = 128);
                circle(d = pipe_dia, $fn = 128);
            }
        }
        translate([pipe_dia/2,0,0])
        linear_extrude(mount_length)
            square([mount_thickness*2,gap], true);
    }
    translate([-pipe_dia/2 - mount_thickness,0, 0]) {
        linear_extrude(mount_length)
            square([base_thickness, mount_width], true);
        
    }
    translate([-14.5,0,10])
        rotate([90,180,0])

    extrusion_mount(mount_length);
    
    
}
